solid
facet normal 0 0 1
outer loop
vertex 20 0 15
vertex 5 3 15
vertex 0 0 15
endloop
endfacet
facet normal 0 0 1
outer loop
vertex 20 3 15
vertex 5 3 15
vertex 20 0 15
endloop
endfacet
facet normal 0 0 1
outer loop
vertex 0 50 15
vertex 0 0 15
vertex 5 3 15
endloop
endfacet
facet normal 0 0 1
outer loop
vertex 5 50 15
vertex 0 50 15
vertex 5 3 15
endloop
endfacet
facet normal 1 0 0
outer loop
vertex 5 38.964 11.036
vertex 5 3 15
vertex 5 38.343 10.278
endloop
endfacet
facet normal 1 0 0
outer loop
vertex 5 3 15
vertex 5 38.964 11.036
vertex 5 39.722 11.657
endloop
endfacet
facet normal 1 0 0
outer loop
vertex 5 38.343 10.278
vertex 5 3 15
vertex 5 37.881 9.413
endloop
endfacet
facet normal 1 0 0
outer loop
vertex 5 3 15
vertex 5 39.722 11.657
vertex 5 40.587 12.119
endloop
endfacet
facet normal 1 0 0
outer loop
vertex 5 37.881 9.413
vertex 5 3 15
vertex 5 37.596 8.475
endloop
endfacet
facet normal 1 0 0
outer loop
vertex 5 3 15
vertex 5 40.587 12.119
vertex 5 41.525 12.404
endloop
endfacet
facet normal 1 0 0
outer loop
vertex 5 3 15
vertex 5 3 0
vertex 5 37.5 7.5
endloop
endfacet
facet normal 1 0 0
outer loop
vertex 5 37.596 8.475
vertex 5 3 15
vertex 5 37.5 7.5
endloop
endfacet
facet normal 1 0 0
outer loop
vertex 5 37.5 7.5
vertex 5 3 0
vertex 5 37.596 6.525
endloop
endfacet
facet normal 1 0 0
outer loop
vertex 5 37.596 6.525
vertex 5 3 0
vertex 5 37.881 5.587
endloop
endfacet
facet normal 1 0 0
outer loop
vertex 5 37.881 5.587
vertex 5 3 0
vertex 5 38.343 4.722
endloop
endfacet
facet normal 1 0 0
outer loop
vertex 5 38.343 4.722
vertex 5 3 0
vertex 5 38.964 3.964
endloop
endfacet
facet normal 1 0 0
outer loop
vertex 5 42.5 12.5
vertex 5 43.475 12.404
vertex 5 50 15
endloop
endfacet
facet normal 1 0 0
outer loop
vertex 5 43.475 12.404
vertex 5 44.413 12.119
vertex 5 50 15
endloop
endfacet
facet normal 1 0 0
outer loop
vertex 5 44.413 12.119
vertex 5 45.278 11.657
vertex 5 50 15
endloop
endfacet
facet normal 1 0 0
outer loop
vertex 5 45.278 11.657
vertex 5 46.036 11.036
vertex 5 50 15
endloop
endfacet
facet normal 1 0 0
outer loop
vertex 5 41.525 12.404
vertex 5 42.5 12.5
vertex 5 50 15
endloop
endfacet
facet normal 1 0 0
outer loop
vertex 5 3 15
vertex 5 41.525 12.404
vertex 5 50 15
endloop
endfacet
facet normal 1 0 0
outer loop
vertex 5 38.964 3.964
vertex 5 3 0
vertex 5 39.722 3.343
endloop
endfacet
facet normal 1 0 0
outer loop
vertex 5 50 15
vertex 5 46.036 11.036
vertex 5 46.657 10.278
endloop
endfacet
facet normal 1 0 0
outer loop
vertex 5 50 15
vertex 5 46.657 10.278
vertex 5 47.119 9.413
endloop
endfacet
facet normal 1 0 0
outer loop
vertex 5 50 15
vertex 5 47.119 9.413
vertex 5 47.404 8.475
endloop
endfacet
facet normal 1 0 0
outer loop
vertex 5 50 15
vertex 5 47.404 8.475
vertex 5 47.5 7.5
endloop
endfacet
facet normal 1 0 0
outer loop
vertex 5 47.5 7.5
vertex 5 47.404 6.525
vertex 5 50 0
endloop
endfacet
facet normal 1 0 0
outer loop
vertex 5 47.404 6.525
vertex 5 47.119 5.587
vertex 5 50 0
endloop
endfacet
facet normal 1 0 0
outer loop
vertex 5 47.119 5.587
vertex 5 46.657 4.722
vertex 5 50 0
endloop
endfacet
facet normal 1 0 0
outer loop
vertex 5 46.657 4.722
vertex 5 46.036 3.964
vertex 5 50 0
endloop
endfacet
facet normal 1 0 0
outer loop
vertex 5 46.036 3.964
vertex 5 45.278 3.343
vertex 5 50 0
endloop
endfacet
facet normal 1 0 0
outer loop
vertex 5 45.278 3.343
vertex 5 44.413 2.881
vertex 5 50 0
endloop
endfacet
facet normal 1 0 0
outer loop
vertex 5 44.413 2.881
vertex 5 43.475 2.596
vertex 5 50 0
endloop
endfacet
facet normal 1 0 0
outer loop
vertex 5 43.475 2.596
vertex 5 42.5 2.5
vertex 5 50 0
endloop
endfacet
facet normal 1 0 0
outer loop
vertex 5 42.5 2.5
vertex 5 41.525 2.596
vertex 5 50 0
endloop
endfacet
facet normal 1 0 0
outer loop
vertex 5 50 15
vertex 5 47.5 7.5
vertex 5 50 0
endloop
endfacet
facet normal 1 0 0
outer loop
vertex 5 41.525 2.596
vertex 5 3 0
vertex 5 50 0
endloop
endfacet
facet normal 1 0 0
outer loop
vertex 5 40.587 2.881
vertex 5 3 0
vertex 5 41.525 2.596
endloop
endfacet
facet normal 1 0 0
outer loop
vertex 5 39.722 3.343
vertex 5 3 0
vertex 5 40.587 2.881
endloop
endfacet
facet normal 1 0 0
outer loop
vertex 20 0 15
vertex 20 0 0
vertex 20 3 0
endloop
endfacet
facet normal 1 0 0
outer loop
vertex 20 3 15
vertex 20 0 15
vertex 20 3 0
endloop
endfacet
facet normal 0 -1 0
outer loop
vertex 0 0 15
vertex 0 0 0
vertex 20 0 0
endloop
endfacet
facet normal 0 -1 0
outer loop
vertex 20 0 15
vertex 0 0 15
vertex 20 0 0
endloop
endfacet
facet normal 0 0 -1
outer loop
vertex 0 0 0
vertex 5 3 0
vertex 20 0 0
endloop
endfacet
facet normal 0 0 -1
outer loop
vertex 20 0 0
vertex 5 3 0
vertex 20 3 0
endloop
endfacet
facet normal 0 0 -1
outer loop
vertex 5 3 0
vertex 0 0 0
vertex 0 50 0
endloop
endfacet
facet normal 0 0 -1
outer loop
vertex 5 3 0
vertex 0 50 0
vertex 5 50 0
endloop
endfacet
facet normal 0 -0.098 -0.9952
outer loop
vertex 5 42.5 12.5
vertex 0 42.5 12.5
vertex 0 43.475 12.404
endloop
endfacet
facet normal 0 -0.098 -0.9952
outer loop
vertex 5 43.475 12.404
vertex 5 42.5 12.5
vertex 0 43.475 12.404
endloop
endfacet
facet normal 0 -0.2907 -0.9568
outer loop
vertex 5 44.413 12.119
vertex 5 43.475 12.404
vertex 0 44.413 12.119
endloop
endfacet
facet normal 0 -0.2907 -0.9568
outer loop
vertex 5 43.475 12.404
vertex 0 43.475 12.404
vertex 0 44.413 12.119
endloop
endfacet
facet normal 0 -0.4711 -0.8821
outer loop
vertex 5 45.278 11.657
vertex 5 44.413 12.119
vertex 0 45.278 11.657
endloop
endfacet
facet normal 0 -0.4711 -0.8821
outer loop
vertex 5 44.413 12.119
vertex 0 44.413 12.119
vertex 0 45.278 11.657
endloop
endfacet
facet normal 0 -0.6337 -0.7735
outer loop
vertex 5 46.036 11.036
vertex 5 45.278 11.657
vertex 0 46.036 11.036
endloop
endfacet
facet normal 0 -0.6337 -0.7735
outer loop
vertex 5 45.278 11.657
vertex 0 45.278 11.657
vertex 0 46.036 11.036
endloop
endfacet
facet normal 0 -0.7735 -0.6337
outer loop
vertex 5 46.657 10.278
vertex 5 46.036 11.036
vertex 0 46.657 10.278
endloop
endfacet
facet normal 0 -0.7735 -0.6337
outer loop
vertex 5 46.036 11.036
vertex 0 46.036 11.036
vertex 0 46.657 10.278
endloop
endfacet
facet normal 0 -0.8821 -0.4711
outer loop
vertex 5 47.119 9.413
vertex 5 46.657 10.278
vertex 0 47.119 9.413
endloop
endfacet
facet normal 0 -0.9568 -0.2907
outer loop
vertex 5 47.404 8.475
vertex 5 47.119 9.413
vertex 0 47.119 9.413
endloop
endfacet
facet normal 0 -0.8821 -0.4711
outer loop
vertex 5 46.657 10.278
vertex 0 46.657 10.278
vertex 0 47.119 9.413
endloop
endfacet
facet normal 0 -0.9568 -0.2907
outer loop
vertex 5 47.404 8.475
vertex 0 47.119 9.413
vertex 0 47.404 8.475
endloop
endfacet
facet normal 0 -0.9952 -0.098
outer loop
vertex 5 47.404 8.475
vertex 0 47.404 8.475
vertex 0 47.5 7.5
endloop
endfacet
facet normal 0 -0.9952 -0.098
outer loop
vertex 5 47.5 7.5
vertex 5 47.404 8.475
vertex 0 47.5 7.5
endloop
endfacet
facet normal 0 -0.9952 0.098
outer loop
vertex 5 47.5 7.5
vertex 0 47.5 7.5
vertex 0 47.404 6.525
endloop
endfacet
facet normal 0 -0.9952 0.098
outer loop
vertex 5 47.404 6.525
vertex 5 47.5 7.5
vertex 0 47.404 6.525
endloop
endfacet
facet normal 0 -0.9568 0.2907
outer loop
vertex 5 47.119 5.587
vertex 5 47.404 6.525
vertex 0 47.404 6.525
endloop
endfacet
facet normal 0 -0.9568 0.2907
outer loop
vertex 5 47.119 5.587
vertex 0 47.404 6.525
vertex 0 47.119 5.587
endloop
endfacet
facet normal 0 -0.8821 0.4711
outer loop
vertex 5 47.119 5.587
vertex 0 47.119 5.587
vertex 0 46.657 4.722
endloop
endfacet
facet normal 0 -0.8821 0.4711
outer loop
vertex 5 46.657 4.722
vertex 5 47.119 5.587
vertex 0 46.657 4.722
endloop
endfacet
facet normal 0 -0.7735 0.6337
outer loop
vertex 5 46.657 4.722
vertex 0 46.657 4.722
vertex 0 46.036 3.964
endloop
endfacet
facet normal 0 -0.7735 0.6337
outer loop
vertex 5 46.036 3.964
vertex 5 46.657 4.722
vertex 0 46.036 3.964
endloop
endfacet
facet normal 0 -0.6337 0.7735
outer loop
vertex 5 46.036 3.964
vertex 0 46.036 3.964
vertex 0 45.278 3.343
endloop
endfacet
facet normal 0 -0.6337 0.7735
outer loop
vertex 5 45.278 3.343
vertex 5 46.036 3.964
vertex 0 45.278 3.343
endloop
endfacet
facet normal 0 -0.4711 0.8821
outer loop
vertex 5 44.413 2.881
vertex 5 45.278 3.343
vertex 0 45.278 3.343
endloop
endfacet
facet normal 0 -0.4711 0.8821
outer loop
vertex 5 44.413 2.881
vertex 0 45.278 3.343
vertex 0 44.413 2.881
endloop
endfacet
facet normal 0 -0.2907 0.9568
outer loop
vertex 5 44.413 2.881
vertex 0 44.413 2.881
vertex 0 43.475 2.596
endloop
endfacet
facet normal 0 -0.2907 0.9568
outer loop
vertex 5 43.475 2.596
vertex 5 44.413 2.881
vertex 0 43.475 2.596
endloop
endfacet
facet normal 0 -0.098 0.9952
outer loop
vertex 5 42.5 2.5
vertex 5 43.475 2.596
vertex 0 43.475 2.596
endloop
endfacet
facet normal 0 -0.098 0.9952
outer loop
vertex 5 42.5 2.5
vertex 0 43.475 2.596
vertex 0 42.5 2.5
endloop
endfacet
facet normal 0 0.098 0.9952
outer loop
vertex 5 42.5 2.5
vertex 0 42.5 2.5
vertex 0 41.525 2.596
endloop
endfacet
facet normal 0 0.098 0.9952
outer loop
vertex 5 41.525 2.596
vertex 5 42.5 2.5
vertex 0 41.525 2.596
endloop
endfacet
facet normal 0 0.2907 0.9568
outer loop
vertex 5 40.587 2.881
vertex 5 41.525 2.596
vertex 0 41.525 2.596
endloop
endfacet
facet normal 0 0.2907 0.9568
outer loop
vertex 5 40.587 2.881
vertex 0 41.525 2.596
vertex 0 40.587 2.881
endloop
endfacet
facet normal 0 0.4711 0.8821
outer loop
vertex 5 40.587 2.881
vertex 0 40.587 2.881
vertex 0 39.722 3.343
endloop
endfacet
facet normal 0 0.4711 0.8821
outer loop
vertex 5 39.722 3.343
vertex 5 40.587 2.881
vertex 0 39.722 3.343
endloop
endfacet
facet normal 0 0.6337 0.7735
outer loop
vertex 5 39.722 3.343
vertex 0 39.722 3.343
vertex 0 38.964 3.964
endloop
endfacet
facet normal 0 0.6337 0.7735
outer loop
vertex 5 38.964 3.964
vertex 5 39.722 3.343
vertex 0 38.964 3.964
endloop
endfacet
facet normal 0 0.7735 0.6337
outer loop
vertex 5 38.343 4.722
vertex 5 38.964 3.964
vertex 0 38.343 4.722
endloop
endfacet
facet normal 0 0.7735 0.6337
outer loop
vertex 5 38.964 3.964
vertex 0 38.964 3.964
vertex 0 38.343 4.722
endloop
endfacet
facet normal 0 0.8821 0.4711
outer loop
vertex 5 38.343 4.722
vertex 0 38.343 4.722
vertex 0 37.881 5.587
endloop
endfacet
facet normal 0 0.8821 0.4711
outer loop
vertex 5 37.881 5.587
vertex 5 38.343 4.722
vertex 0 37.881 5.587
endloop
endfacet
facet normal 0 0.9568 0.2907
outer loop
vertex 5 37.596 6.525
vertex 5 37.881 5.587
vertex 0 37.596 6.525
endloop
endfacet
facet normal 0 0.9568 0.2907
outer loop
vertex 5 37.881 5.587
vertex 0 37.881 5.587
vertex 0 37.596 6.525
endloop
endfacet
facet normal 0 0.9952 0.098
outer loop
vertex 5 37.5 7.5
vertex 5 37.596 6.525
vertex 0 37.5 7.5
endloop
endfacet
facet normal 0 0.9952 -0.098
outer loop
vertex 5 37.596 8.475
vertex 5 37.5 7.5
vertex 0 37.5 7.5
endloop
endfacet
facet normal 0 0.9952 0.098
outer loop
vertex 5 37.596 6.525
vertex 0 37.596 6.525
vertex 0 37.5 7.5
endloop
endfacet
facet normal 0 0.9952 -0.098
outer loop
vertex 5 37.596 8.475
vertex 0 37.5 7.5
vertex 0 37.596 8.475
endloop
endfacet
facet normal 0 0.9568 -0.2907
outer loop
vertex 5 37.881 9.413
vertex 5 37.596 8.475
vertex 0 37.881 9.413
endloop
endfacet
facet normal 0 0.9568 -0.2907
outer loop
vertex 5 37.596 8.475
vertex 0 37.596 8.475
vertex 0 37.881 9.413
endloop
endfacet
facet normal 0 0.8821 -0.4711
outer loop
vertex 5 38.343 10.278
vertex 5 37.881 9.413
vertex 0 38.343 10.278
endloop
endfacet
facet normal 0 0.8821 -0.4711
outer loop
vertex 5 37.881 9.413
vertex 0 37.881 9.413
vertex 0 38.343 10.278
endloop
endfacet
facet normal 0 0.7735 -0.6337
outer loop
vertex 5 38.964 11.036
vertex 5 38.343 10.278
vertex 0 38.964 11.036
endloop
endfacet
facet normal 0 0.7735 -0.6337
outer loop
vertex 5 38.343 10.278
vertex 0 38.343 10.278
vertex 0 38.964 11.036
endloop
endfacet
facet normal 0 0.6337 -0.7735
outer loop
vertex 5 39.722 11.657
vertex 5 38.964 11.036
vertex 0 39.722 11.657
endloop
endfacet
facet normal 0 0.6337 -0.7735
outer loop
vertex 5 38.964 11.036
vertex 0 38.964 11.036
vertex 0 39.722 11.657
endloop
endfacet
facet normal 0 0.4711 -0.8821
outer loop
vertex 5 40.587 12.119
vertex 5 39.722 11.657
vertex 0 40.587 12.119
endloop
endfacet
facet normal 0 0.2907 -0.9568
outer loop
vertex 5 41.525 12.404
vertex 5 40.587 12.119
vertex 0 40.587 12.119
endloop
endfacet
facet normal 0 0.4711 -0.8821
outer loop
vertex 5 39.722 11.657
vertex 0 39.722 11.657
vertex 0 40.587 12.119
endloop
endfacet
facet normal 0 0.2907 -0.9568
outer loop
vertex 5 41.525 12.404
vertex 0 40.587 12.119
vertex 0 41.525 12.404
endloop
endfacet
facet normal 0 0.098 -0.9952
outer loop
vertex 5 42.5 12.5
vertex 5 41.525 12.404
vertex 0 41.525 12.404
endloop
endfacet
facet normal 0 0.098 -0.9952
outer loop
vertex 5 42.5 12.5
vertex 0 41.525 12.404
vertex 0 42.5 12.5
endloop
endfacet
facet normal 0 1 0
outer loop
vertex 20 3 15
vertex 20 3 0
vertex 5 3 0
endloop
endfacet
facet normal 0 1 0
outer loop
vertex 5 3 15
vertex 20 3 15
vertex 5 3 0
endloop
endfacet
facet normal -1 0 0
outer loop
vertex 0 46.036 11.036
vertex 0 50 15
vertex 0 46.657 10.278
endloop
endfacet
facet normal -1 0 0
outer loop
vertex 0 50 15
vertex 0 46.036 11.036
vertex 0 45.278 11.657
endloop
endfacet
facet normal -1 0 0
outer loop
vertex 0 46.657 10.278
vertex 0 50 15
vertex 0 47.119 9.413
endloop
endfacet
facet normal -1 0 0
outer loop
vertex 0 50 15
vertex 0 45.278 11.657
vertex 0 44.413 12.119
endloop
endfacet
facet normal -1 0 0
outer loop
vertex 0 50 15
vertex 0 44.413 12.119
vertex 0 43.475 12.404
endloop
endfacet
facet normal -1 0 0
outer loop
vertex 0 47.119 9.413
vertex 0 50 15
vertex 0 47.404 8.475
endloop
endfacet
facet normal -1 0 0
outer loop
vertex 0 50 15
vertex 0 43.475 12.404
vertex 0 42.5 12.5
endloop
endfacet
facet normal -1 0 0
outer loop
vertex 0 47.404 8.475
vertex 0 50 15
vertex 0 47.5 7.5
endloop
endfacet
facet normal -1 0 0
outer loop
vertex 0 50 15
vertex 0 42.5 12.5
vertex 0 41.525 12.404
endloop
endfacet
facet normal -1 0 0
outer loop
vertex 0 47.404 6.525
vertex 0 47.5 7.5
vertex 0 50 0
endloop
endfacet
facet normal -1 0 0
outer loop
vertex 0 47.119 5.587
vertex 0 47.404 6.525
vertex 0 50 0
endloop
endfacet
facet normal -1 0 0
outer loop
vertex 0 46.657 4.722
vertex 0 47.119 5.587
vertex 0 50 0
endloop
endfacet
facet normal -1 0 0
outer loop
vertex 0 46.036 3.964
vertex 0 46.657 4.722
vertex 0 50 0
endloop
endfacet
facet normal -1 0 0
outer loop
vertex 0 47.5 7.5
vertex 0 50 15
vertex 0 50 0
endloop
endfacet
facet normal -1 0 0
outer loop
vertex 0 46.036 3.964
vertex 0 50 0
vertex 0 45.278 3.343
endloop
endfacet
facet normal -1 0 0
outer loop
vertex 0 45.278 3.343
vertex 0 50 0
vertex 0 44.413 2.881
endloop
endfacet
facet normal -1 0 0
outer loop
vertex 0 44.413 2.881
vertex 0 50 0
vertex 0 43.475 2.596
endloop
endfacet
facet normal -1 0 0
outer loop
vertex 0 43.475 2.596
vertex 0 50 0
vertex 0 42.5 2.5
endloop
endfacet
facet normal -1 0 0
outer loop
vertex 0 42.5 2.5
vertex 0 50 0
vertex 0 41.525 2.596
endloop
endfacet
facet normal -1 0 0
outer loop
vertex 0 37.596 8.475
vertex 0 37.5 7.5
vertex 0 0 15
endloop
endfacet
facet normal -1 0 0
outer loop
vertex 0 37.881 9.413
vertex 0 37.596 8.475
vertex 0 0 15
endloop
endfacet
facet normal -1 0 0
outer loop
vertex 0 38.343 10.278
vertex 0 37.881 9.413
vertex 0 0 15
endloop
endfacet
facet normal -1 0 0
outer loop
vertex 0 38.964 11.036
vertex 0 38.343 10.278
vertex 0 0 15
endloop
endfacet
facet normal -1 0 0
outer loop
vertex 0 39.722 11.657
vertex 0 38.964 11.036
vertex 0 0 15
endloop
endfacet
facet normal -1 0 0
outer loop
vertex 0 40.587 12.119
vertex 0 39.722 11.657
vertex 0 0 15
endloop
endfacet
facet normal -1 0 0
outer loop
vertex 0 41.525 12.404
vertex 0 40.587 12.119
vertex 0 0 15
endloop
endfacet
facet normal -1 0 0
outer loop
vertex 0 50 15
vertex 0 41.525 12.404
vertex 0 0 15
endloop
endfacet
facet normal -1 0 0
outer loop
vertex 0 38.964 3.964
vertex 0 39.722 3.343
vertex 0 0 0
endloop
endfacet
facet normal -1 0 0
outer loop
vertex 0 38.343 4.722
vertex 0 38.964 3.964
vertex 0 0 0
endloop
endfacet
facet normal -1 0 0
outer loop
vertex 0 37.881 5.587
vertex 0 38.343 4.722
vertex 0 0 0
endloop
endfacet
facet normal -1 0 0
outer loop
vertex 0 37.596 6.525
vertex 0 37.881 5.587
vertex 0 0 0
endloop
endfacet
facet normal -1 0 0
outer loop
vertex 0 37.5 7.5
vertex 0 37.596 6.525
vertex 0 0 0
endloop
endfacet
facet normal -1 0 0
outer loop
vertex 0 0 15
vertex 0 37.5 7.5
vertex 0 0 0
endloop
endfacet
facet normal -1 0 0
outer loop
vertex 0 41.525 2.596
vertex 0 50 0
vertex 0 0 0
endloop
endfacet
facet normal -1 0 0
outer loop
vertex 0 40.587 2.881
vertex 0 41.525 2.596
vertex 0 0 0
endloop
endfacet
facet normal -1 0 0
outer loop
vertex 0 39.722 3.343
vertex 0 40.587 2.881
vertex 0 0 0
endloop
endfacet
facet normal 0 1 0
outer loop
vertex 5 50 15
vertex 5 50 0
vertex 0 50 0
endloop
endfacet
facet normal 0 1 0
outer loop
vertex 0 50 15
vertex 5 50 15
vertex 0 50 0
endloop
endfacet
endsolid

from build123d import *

# Parameters (mm, degrees)
RESSALTO_EXTRUS_O1_DEPTH = 15
ESBO_O2_R                = 5
CORTE_EXTRUS_O1_DEPTH    = 21


with BuildPart() as part:
    # Esboço1 → Ressalto-extrusão1 (new body)
    with BuildSketch(Plane.XY):
        Polygon((0, 0), (20, 0), (20, 3), (5, 3), (5, 50), (0, 50), align=None)
    extrude(amount=RESSALTO_EXTRUS_O1_DEPTH)

    # Esboço2 → Corte-extrusão1 (cut, through all)
    with BuildSketch(Plane.ZY):
        with Locations((7.5, 42.5)):
            Circle(ESBO_O2_R)
    extrude(amount=-CORTE_EXTRUS_O1_DEPTH, mode=Mode.SUBTRACT)


solid = part.part
